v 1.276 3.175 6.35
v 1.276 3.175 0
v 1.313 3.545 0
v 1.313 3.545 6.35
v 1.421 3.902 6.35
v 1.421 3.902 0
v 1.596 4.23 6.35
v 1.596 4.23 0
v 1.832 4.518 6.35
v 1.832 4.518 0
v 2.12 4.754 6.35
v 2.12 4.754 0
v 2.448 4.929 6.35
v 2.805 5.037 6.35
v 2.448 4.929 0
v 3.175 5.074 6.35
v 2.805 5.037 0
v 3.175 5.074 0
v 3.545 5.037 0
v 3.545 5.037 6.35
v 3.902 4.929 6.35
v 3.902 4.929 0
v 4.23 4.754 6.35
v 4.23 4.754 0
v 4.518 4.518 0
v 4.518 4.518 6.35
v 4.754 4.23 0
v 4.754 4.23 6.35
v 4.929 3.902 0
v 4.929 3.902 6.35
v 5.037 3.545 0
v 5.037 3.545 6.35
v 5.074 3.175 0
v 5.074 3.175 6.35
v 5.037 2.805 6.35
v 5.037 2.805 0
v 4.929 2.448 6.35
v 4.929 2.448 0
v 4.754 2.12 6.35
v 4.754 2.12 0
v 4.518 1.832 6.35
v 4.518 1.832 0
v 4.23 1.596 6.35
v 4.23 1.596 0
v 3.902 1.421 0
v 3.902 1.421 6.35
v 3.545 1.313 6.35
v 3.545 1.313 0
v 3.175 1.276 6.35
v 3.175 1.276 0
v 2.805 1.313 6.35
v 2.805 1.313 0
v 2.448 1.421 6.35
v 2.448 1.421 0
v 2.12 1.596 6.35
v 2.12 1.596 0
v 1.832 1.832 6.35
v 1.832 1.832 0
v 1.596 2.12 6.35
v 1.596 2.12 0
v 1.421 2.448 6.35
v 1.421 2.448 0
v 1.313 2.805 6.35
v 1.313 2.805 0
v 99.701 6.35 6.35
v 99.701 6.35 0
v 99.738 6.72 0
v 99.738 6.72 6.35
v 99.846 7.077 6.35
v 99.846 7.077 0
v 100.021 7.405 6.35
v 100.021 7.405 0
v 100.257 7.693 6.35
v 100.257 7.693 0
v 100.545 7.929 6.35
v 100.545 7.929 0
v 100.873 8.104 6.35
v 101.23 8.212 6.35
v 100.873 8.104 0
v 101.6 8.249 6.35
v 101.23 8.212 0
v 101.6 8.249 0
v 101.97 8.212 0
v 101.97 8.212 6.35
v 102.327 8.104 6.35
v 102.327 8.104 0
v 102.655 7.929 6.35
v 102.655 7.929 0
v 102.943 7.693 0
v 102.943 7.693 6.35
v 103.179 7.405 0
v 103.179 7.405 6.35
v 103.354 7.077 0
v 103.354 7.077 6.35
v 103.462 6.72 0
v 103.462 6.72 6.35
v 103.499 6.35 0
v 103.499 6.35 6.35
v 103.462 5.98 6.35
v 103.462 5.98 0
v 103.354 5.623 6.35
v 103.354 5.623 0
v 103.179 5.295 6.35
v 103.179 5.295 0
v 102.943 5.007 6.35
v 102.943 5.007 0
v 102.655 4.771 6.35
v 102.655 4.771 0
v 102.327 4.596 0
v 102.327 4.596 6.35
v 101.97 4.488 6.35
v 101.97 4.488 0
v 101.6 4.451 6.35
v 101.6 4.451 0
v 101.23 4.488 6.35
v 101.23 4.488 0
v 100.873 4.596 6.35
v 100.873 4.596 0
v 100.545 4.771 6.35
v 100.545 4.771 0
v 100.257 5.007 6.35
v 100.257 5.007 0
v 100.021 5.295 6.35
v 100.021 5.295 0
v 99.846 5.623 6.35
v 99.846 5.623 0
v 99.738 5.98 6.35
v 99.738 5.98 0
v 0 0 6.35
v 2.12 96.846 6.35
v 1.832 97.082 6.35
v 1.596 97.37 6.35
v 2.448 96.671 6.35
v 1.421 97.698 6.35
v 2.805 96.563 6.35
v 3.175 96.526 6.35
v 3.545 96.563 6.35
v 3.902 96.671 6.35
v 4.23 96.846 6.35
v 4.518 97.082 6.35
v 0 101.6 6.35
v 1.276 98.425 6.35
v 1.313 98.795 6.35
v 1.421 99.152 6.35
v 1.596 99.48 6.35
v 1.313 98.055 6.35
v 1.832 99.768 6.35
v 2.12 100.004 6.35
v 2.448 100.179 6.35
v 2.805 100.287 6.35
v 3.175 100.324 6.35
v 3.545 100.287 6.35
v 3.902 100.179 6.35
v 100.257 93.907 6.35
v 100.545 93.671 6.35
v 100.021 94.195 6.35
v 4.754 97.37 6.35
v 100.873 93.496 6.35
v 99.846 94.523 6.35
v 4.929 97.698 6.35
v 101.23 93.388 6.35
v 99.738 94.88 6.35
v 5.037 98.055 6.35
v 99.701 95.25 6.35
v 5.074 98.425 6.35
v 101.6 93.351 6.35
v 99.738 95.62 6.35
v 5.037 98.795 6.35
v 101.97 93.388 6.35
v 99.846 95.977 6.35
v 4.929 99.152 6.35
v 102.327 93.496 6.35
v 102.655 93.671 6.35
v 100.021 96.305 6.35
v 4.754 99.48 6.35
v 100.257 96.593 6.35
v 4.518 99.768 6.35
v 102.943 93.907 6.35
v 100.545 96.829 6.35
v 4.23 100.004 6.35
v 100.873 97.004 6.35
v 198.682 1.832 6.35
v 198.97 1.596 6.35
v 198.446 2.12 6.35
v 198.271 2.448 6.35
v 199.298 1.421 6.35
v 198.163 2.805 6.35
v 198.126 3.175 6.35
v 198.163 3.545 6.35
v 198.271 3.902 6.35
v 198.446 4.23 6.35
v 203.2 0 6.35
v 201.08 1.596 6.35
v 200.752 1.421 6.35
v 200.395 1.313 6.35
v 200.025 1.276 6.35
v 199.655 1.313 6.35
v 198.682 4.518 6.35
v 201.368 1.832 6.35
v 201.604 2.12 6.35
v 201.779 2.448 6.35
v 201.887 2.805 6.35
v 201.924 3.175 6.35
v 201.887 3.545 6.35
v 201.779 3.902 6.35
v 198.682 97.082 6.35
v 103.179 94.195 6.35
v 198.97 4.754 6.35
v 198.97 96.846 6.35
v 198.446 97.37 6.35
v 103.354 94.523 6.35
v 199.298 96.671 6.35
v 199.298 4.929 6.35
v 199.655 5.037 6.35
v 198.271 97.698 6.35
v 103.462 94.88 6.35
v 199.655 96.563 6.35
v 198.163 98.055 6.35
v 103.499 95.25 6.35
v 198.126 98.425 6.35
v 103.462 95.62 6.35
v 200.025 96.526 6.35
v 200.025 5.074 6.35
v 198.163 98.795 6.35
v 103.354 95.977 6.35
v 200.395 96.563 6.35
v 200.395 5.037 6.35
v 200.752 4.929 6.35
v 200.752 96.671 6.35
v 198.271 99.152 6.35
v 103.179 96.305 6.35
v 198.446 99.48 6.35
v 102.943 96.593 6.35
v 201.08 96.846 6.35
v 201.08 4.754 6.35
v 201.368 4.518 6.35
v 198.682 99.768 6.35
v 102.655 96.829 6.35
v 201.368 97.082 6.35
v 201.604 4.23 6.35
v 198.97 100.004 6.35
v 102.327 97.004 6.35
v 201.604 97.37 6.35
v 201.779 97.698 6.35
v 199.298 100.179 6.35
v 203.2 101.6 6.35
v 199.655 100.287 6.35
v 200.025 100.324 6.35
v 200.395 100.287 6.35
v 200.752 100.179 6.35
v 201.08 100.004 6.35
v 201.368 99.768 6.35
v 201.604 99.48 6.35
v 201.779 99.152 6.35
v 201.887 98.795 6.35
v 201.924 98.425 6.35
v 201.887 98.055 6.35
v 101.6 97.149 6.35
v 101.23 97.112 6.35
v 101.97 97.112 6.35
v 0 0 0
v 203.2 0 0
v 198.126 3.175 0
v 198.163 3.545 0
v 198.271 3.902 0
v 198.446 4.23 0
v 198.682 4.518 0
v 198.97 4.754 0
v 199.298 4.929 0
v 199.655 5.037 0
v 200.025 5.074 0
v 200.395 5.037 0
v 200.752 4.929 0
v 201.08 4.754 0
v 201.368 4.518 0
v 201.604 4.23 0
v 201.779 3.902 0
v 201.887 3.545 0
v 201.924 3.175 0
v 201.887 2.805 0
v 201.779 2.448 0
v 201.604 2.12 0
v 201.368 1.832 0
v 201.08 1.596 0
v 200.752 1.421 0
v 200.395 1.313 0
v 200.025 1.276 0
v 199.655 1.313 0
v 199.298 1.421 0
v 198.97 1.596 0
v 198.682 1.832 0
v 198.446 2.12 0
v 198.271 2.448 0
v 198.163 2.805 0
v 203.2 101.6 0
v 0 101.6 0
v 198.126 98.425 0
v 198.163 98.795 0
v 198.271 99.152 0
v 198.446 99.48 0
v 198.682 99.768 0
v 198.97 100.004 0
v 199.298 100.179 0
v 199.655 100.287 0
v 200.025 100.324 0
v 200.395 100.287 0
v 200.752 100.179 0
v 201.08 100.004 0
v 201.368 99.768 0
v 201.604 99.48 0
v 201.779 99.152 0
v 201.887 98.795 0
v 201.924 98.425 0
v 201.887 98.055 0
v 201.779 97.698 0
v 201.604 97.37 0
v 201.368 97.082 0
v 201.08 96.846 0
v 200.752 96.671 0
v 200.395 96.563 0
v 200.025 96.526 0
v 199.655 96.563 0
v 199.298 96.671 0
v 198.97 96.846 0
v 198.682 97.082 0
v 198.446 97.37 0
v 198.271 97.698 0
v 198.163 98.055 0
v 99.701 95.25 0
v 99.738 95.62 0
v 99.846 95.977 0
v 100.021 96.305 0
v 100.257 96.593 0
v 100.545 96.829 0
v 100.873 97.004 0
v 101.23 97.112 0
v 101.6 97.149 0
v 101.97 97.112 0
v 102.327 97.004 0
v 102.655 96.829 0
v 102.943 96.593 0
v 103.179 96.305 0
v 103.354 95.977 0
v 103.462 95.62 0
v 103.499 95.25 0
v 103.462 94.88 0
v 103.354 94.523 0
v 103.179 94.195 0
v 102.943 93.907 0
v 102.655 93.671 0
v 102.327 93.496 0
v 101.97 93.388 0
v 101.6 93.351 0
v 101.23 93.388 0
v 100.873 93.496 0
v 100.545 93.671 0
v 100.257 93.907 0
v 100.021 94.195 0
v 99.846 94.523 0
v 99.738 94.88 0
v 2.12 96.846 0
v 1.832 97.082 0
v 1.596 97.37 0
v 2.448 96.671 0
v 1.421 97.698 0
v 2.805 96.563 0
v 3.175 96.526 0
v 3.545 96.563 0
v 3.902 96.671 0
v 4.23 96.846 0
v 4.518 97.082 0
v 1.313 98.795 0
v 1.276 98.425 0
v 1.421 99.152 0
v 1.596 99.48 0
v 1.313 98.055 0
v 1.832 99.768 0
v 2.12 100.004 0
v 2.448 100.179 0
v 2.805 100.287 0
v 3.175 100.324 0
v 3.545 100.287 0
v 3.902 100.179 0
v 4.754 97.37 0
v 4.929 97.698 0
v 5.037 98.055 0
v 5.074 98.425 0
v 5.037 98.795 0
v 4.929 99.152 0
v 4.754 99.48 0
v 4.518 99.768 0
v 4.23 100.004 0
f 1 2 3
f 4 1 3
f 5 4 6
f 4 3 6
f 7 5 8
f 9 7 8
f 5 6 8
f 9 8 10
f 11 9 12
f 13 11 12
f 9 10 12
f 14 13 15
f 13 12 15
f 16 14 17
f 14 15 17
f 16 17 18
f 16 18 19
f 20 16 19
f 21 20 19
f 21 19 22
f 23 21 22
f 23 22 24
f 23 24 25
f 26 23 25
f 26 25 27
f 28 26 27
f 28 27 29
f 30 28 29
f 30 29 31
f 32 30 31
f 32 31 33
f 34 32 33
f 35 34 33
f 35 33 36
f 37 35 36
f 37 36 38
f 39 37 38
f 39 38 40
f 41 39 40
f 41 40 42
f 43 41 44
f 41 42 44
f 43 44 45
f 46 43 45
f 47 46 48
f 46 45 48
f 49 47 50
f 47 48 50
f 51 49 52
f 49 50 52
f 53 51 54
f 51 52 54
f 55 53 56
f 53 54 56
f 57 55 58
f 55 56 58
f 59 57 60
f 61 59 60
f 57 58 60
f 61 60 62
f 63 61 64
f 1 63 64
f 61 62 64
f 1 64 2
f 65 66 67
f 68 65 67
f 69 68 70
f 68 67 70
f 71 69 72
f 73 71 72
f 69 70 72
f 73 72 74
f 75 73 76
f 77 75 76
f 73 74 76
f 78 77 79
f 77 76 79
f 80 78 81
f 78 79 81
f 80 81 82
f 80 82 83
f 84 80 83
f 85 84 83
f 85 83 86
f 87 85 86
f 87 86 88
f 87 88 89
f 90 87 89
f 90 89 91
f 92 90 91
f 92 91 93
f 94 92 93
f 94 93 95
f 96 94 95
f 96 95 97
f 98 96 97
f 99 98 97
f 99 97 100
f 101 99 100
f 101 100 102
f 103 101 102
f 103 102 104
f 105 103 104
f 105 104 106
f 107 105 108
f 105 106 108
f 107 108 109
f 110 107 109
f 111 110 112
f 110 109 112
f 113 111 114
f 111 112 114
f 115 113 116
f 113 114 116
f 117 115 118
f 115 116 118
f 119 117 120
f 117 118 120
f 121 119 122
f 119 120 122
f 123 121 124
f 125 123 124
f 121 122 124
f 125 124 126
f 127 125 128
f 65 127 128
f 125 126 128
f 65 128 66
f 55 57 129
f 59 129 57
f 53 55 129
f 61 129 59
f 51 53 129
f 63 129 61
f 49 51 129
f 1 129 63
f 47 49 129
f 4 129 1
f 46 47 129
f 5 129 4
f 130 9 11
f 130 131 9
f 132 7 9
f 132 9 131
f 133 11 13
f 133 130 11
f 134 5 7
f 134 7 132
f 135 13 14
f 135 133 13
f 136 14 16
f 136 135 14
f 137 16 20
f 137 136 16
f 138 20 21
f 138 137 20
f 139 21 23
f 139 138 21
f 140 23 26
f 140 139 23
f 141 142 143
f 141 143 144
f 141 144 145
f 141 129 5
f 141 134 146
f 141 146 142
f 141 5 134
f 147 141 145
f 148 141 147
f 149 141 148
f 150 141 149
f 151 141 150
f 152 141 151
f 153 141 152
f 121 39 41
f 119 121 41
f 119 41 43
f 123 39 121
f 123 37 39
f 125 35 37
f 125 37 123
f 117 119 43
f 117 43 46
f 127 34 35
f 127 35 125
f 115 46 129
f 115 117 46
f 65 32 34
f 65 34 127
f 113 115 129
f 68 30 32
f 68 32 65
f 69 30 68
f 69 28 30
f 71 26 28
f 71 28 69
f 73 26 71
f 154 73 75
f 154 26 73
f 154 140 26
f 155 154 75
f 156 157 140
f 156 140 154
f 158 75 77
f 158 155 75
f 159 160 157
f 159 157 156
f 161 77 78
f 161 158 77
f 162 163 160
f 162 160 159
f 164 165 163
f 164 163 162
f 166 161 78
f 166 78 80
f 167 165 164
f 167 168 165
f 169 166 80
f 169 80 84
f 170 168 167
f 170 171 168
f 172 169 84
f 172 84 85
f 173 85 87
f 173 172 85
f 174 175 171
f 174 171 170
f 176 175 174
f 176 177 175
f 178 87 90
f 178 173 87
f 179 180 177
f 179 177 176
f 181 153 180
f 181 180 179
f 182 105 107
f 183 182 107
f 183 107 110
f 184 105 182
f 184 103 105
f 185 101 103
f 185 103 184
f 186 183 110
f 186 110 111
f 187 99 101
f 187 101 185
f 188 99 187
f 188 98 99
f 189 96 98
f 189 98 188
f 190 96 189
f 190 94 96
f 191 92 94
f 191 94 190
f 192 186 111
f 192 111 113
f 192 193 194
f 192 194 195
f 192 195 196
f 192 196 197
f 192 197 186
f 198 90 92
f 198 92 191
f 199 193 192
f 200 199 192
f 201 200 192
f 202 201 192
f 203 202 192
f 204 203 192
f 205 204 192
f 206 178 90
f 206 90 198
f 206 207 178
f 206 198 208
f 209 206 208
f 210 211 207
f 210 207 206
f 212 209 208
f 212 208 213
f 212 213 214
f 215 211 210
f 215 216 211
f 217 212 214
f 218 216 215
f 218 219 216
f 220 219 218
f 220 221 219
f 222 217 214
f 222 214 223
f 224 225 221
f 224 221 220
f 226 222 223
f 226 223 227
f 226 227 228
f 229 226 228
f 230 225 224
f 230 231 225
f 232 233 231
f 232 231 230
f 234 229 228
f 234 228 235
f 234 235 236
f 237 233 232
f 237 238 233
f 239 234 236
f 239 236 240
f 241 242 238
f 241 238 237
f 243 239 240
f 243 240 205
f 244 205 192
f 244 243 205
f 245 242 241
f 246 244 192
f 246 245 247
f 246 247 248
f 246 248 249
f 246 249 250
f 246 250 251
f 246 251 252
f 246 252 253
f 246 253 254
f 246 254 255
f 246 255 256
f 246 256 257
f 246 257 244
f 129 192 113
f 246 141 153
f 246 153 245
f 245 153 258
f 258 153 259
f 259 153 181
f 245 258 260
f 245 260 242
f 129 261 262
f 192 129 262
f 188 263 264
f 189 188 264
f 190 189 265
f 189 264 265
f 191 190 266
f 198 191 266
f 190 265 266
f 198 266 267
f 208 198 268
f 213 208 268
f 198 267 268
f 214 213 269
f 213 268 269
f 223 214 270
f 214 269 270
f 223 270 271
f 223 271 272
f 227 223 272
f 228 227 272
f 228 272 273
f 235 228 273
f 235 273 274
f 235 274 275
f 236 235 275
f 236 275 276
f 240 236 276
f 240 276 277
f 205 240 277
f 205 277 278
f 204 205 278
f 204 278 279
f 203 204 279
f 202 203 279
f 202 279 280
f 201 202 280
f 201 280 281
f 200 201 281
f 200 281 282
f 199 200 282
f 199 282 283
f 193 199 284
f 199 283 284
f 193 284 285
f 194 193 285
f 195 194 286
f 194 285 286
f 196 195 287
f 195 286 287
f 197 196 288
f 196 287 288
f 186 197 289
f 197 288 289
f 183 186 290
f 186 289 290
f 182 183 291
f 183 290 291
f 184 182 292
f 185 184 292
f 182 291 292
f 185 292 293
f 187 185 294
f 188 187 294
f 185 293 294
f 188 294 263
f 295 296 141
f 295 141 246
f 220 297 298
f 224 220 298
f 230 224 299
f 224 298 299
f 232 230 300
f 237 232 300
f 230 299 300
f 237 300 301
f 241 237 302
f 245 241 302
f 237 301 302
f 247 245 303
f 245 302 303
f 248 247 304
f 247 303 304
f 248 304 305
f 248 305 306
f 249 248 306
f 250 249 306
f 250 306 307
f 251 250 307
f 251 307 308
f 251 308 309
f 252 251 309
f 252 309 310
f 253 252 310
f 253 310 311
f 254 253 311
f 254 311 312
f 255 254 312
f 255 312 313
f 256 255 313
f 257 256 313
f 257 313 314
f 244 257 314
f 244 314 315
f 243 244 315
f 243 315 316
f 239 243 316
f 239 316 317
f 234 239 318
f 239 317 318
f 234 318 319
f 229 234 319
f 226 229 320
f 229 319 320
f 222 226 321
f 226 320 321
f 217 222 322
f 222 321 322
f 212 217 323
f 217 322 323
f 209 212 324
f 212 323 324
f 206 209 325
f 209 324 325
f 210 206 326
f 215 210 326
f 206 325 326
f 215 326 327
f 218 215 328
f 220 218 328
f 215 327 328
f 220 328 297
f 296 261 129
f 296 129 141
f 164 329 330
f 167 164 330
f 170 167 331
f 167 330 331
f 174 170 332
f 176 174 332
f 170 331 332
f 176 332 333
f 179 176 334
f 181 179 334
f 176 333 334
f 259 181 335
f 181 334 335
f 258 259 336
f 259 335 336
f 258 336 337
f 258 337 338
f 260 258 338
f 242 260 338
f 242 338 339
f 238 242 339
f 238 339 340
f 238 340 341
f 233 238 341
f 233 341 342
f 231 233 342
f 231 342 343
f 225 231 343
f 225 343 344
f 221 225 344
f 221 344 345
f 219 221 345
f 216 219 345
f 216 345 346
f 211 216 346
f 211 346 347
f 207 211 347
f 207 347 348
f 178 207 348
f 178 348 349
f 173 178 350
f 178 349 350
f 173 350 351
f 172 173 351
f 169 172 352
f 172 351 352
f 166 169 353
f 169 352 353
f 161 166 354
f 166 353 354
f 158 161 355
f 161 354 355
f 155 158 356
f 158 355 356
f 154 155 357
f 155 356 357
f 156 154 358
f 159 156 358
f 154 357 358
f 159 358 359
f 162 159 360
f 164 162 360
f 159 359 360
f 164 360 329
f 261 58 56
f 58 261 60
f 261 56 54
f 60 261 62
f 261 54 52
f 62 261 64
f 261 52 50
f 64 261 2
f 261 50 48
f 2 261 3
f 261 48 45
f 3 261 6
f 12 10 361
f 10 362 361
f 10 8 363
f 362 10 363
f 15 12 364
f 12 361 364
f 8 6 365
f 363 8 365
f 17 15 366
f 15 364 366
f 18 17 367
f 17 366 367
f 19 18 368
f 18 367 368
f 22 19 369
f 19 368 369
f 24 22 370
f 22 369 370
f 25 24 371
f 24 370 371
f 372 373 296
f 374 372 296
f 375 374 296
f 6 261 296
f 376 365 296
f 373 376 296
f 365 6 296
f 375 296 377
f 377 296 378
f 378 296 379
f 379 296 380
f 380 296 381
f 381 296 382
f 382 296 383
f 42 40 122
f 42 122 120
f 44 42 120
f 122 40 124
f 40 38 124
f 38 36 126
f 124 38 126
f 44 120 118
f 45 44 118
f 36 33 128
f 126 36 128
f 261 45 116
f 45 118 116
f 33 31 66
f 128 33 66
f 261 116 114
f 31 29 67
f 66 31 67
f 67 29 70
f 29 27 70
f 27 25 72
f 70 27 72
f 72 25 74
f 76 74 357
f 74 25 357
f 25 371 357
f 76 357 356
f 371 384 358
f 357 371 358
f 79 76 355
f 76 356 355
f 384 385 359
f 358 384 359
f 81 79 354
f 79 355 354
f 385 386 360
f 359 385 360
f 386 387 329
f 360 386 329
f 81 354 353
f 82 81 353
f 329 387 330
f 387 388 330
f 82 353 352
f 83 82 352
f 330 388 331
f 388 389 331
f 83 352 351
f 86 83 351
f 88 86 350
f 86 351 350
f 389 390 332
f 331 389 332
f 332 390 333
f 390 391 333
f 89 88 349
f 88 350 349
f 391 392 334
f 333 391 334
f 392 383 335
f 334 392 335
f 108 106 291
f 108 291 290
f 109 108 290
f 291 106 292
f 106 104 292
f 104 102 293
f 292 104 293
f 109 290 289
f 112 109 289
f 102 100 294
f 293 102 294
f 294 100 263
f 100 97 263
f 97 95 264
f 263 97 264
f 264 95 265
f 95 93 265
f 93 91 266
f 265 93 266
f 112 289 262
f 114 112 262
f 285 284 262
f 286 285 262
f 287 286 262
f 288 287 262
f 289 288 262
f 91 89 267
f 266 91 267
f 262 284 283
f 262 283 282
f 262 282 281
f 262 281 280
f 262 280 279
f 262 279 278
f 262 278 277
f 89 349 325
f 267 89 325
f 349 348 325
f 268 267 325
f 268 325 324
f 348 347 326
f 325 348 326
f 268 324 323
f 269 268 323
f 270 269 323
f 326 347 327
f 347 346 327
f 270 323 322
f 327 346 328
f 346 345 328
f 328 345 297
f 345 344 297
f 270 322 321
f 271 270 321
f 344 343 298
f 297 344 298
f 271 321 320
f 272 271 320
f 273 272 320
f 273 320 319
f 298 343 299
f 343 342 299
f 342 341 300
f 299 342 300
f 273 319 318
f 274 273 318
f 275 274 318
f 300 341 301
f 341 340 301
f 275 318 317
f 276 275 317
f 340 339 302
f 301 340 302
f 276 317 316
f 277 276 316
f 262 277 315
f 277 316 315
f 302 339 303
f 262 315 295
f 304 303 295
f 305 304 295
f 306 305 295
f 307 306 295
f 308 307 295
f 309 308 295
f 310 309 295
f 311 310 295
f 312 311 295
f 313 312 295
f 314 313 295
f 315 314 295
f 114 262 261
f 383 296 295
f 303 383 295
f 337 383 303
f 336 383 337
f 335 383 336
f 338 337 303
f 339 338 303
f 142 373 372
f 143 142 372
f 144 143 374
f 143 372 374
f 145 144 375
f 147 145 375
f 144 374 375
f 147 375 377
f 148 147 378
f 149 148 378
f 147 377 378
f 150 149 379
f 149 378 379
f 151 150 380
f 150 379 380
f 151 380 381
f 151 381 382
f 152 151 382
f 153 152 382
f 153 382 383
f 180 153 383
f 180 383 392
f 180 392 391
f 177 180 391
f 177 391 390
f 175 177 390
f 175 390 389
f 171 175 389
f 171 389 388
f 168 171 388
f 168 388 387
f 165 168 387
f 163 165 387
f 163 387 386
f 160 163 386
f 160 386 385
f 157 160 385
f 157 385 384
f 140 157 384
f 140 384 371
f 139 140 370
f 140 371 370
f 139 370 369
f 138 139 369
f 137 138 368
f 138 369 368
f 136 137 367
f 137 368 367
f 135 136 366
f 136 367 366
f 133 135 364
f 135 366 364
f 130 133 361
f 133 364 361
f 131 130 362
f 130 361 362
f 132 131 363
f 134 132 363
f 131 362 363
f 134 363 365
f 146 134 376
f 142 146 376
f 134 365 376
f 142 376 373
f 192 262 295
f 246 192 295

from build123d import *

# Parameters (mm, degrees)
SKETCH1_W             = 203.2
SKETCH1_H             = 101.6
BOSS_EXTRUDE1_DEPTH   = 6.35
F_6_CLEARANCE_HOLE1_D = 3.7973


with BuildPart() as part:
    # Sketch1 → Boss-Extrude1 (new body)
    with BuildSketch(Plane.XY):
        with Locations((101.6, 50.8)):
            Rectangle(SKETCH1_W, SKETCH1_H)
    extrude(amount=BOSS_EXTRUDE1_DEPTH)

    # #6 Clearance Hole1 (through all)
    with Locations(Plane.XY.offset(6.35)):
        with Locations((3.175, 3.175), (3.175, 98.425), (200.025, 98.425), (200.025, 3.175), (101.6, 95.25), (101.6, 6.35)):
            Hole(F_6_CLEARANCE_HOLE1_D / 2)


solid = part.part
